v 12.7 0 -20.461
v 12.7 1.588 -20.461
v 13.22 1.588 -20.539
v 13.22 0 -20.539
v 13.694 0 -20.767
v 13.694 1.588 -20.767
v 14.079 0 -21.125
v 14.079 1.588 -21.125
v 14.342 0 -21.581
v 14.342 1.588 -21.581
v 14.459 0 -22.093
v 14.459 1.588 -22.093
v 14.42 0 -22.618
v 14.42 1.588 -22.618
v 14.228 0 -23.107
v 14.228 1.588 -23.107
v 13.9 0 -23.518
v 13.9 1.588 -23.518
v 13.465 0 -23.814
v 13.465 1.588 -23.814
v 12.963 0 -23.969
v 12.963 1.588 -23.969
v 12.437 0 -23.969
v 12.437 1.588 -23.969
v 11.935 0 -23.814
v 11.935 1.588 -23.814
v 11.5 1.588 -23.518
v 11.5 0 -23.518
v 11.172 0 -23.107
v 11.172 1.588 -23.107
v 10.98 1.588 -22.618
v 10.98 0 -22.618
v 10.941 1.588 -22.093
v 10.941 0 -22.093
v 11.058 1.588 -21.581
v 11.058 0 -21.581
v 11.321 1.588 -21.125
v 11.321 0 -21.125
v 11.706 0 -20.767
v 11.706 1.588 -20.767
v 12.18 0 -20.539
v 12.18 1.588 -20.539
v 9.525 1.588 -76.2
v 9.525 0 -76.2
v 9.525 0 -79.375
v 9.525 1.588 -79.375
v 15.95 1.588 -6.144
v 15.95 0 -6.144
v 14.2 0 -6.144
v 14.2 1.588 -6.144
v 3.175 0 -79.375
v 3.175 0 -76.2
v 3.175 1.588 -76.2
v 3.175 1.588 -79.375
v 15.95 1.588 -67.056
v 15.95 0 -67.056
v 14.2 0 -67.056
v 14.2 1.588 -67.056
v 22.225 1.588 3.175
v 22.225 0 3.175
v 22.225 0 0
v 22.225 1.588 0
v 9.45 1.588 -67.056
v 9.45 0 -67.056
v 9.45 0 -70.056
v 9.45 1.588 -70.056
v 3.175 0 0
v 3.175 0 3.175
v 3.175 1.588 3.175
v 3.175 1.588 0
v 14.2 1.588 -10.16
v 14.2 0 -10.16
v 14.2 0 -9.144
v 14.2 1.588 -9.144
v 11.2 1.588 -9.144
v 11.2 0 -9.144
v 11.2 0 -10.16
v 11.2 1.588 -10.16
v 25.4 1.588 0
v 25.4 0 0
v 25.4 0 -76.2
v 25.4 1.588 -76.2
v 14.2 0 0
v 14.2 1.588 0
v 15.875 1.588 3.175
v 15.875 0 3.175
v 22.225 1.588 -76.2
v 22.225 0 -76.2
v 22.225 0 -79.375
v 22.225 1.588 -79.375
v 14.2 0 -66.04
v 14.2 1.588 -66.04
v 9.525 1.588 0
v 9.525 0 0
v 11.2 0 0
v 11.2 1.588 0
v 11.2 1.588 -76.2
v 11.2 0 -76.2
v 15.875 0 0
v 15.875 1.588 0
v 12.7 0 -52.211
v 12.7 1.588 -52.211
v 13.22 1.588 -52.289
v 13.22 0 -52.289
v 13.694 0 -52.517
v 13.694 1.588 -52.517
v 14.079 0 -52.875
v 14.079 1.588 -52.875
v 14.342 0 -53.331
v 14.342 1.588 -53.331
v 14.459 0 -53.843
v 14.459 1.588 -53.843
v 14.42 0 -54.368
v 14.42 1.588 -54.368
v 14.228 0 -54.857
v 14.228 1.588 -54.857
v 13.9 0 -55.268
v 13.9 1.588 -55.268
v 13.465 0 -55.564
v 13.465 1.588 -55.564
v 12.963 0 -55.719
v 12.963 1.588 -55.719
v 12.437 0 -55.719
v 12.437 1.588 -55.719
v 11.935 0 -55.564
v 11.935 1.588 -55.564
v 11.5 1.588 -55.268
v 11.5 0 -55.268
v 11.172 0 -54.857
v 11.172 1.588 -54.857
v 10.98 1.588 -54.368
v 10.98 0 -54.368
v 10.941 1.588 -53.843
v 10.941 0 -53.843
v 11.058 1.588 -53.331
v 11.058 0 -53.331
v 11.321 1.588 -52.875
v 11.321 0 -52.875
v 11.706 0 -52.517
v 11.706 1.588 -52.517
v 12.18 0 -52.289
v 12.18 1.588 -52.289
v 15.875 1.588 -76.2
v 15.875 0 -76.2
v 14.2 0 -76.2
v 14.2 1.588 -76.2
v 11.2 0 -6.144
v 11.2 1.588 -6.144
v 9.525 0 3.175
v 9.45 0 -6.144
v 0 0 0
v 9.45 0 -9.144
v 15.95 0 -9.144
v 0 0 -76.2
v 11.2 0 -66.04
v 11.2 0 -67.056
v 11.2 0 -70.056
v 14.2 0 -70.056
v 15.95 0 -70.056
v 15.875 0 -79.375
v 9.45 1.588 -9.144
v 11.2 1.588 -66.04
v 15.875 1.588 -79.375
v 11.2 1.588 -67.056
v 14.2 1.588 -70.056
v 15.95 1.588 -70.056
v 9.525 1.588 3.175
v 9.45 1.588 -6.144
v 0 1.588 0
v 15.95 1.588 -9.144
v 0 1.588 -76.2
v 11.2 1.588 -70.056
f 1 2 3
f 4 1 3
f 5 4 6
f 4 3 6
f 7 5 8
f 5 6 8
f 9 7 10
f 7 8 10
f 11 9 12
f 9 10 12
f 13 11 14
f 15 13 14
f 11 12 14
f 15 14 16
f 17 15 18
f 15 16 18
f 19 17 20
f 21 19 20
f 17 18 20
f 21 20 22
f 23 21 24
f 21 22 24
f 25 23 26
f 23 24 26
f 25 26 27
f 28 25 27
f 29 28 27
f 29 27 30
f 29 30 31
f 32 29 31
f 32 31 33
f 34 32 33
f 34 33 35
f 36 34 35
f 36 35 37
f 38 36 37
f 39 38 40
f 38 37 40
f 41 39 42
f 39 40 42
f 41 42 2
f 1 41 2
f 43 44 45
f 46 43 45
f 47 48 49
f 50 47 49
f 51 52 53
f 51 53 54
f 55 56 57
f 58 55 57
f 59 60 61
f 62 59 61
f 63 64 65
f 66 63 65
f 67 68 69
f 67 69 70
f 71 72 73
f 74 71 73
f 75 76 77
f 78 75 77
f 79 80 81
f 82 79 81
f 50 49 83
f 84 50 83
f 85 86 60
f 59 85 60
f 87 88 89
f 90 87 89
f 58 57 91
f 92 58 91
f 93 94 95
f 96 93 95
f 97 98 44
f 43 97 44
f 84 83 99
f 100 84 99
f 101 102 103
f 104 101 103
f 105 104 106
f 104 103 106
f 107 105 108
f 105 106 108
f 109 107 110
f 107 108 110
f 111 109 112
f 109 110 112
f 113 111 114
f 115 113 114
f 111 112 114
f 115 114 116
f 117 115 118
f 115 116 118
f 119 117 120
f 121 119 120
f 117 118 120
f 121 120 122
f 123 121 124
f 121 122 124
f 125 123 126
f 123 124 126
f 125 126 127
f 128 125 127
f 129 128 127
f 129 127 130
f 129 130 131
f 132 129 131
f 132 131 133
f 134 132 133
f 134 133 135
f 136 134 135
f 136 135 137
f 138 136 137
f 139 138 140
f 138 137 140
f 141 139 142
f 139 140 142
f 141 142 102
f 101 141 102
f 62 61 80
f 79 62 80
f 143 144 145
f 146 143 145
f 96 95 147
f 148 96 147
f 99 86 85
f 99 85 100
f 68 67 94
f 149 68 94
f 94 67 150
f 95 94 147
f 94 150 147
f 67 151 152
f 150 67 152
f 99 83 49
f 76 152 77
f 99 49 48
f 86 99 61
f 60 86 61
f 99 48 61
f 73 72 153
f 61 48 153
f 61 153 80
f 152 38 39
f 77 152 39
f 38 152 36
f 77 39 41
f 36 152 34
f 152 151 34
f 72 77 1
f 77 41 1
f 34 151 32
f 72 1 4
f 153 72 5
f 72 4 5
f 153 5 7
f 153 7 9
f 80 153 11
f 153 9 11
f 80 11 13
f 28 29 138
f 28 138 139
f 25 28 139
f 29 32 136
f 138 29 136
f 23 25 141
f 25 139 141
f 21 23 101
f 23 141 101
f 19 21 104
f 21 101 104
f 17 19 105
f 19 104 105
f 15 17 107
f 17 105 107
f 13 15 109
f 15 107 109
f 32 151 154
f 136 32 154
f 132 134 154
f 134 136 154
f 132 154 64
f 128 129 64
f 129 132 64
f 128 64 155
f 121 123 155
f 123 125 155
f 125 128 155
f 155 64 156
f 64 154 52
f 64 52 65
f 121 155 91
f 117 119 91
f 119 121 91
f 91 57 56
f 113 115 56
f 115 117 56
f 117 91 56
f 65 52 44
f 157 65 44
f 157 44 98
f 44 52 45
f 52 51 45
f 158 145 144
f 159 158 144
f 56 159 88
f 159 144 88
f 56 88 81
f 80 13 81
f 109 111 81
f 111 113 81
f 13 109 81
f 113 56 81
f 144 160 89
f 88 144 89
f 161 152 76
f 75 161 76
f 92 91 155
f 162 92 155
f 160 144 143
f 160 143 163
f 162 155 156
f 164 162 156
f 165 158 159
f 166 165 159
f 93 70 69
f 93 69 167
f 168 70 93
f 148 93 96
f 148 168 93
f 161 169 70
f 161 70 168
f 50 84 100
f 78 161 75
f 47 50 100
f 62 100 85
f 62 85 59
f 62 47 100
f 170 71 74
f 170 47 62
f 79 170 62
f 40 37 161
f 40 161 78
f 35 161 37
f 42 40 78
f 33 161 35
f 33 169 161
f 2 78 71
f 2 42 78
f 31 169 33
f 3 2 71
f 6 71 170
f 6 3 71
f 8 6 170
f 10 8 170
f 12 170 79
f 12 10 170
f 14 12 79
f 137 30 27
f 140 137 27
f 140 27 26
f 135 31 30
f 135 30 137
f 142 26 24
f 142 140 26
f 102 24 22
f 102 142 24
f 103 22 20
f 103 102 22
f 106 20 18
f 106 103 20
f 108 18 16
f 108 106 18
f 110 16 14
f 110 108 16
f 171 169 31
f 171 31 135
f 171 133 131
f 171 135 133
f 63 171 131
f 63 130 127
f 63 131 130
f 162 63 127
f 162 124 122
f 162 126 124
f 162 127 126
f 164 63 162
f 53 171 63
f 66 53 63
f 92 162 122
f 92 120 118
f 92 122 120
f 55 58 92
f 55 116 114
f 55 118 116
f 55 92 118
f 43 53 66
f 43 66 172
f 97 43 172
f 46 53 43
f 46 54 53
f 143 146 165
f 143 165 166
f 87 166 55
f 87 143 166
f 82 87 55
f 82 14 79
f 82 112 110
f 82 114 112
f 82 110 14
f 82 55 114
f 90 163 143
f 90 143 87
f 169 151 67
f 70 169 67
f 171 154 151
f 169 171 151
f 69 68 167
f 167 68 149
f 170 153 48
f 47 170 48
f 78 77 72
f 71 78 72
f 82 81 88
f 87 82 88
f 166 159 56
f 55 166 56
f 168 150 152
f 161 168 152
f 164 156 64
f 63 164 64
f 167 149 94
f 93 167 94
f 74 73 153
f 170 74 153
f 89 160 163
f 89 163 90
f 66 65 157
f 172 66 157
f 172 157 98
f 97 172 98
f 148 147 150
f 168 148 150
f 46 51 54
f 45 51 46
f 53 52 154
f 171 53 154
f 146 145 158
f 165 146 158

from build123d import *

# Parameters (mm, degrees)
SKETCH1_W           = 6.35
SKETCH1_H           = 3.175
BOSS_EXTRUDE1_DEPTH = 1.5875
SKETCH2_R           = 1.76403
CUT_EXTRUDE1_DEPTH  = 1.5875


with BuildPart() as part:
    # Sketch1 → Boss-Extrude1 (new body)
    with BuildSketch(Plane(origin=(0, 0, 0), x_dir=(1, 0, 0), z_dir=(0, 1, 0))):
        Polygon((0, 76.2), (0, 0), (3.175, 0), (9.525, 0), (11.2, 0), (11.2, 6.144), (9.45, 6.144), (9.45, 9.144), (11.2, 9.144), (11.2, 10.16), (14.2, 10.16), (14.2, 9.144), (15.95, 9.144), (15.95, 6.144), (14.2, 6.144), (14.2, 0), (15.875, 0), (22.225, 0), (25.4, 0), (25.4, 76.2), (22.225, 76.2), (15.875, 76.2), (14.2, 76.2), (14.2, 70.056), (15.95, 70.056), (15.95, 67.056), (14.2, 67.056), (14.2, 66.04), (11.2, 66.04), (11.2, 67.056), (9.45, 67.056), (9.45, 70.056), (11.2, 70.056), (11.2, 76.2), (9.525, 76.2), (3.175, 76.2), align=None)
        with Locations((6.35, 77.7875)):
            Rectangle(SKETCH1_W, SKETCH1_H)
        with Locations((19.05, 77.7875)):
            Rectangle(SKETCH1_W, SKETCH1_H)
        with Locations((6.35, -1.5875)):
            Rectangle(SKETCH1_W, SKETCH1_H)
        with Locations((19.05, -1.5875)):
            Rectangle(SKETCH1_W, SKETCH1_H)
    extrude(amount=BOSS_EXTRUDE1_DEPTH)

    # Sketch2 → Cut-Extrude1 (cut)
    with BuildSketch(Plane(origin=(0, 1.5875, 0), x_dir=(1, 0, 0), z_dir=(0, 1, 0))):
        with Locations(Location((12.7, 53.975, 0), (0, 0, 270))):
            Circle(SKETCH2_R)
        with Locations(Location((12.7, 22.225, 0), (0, 0, 270))):
            Circle(SKETCH2_R)
    extrude(amount=-CUT_EXTRUDE1_DEPTH, mode=Mode.SUBTRACT)


solid = part.part
